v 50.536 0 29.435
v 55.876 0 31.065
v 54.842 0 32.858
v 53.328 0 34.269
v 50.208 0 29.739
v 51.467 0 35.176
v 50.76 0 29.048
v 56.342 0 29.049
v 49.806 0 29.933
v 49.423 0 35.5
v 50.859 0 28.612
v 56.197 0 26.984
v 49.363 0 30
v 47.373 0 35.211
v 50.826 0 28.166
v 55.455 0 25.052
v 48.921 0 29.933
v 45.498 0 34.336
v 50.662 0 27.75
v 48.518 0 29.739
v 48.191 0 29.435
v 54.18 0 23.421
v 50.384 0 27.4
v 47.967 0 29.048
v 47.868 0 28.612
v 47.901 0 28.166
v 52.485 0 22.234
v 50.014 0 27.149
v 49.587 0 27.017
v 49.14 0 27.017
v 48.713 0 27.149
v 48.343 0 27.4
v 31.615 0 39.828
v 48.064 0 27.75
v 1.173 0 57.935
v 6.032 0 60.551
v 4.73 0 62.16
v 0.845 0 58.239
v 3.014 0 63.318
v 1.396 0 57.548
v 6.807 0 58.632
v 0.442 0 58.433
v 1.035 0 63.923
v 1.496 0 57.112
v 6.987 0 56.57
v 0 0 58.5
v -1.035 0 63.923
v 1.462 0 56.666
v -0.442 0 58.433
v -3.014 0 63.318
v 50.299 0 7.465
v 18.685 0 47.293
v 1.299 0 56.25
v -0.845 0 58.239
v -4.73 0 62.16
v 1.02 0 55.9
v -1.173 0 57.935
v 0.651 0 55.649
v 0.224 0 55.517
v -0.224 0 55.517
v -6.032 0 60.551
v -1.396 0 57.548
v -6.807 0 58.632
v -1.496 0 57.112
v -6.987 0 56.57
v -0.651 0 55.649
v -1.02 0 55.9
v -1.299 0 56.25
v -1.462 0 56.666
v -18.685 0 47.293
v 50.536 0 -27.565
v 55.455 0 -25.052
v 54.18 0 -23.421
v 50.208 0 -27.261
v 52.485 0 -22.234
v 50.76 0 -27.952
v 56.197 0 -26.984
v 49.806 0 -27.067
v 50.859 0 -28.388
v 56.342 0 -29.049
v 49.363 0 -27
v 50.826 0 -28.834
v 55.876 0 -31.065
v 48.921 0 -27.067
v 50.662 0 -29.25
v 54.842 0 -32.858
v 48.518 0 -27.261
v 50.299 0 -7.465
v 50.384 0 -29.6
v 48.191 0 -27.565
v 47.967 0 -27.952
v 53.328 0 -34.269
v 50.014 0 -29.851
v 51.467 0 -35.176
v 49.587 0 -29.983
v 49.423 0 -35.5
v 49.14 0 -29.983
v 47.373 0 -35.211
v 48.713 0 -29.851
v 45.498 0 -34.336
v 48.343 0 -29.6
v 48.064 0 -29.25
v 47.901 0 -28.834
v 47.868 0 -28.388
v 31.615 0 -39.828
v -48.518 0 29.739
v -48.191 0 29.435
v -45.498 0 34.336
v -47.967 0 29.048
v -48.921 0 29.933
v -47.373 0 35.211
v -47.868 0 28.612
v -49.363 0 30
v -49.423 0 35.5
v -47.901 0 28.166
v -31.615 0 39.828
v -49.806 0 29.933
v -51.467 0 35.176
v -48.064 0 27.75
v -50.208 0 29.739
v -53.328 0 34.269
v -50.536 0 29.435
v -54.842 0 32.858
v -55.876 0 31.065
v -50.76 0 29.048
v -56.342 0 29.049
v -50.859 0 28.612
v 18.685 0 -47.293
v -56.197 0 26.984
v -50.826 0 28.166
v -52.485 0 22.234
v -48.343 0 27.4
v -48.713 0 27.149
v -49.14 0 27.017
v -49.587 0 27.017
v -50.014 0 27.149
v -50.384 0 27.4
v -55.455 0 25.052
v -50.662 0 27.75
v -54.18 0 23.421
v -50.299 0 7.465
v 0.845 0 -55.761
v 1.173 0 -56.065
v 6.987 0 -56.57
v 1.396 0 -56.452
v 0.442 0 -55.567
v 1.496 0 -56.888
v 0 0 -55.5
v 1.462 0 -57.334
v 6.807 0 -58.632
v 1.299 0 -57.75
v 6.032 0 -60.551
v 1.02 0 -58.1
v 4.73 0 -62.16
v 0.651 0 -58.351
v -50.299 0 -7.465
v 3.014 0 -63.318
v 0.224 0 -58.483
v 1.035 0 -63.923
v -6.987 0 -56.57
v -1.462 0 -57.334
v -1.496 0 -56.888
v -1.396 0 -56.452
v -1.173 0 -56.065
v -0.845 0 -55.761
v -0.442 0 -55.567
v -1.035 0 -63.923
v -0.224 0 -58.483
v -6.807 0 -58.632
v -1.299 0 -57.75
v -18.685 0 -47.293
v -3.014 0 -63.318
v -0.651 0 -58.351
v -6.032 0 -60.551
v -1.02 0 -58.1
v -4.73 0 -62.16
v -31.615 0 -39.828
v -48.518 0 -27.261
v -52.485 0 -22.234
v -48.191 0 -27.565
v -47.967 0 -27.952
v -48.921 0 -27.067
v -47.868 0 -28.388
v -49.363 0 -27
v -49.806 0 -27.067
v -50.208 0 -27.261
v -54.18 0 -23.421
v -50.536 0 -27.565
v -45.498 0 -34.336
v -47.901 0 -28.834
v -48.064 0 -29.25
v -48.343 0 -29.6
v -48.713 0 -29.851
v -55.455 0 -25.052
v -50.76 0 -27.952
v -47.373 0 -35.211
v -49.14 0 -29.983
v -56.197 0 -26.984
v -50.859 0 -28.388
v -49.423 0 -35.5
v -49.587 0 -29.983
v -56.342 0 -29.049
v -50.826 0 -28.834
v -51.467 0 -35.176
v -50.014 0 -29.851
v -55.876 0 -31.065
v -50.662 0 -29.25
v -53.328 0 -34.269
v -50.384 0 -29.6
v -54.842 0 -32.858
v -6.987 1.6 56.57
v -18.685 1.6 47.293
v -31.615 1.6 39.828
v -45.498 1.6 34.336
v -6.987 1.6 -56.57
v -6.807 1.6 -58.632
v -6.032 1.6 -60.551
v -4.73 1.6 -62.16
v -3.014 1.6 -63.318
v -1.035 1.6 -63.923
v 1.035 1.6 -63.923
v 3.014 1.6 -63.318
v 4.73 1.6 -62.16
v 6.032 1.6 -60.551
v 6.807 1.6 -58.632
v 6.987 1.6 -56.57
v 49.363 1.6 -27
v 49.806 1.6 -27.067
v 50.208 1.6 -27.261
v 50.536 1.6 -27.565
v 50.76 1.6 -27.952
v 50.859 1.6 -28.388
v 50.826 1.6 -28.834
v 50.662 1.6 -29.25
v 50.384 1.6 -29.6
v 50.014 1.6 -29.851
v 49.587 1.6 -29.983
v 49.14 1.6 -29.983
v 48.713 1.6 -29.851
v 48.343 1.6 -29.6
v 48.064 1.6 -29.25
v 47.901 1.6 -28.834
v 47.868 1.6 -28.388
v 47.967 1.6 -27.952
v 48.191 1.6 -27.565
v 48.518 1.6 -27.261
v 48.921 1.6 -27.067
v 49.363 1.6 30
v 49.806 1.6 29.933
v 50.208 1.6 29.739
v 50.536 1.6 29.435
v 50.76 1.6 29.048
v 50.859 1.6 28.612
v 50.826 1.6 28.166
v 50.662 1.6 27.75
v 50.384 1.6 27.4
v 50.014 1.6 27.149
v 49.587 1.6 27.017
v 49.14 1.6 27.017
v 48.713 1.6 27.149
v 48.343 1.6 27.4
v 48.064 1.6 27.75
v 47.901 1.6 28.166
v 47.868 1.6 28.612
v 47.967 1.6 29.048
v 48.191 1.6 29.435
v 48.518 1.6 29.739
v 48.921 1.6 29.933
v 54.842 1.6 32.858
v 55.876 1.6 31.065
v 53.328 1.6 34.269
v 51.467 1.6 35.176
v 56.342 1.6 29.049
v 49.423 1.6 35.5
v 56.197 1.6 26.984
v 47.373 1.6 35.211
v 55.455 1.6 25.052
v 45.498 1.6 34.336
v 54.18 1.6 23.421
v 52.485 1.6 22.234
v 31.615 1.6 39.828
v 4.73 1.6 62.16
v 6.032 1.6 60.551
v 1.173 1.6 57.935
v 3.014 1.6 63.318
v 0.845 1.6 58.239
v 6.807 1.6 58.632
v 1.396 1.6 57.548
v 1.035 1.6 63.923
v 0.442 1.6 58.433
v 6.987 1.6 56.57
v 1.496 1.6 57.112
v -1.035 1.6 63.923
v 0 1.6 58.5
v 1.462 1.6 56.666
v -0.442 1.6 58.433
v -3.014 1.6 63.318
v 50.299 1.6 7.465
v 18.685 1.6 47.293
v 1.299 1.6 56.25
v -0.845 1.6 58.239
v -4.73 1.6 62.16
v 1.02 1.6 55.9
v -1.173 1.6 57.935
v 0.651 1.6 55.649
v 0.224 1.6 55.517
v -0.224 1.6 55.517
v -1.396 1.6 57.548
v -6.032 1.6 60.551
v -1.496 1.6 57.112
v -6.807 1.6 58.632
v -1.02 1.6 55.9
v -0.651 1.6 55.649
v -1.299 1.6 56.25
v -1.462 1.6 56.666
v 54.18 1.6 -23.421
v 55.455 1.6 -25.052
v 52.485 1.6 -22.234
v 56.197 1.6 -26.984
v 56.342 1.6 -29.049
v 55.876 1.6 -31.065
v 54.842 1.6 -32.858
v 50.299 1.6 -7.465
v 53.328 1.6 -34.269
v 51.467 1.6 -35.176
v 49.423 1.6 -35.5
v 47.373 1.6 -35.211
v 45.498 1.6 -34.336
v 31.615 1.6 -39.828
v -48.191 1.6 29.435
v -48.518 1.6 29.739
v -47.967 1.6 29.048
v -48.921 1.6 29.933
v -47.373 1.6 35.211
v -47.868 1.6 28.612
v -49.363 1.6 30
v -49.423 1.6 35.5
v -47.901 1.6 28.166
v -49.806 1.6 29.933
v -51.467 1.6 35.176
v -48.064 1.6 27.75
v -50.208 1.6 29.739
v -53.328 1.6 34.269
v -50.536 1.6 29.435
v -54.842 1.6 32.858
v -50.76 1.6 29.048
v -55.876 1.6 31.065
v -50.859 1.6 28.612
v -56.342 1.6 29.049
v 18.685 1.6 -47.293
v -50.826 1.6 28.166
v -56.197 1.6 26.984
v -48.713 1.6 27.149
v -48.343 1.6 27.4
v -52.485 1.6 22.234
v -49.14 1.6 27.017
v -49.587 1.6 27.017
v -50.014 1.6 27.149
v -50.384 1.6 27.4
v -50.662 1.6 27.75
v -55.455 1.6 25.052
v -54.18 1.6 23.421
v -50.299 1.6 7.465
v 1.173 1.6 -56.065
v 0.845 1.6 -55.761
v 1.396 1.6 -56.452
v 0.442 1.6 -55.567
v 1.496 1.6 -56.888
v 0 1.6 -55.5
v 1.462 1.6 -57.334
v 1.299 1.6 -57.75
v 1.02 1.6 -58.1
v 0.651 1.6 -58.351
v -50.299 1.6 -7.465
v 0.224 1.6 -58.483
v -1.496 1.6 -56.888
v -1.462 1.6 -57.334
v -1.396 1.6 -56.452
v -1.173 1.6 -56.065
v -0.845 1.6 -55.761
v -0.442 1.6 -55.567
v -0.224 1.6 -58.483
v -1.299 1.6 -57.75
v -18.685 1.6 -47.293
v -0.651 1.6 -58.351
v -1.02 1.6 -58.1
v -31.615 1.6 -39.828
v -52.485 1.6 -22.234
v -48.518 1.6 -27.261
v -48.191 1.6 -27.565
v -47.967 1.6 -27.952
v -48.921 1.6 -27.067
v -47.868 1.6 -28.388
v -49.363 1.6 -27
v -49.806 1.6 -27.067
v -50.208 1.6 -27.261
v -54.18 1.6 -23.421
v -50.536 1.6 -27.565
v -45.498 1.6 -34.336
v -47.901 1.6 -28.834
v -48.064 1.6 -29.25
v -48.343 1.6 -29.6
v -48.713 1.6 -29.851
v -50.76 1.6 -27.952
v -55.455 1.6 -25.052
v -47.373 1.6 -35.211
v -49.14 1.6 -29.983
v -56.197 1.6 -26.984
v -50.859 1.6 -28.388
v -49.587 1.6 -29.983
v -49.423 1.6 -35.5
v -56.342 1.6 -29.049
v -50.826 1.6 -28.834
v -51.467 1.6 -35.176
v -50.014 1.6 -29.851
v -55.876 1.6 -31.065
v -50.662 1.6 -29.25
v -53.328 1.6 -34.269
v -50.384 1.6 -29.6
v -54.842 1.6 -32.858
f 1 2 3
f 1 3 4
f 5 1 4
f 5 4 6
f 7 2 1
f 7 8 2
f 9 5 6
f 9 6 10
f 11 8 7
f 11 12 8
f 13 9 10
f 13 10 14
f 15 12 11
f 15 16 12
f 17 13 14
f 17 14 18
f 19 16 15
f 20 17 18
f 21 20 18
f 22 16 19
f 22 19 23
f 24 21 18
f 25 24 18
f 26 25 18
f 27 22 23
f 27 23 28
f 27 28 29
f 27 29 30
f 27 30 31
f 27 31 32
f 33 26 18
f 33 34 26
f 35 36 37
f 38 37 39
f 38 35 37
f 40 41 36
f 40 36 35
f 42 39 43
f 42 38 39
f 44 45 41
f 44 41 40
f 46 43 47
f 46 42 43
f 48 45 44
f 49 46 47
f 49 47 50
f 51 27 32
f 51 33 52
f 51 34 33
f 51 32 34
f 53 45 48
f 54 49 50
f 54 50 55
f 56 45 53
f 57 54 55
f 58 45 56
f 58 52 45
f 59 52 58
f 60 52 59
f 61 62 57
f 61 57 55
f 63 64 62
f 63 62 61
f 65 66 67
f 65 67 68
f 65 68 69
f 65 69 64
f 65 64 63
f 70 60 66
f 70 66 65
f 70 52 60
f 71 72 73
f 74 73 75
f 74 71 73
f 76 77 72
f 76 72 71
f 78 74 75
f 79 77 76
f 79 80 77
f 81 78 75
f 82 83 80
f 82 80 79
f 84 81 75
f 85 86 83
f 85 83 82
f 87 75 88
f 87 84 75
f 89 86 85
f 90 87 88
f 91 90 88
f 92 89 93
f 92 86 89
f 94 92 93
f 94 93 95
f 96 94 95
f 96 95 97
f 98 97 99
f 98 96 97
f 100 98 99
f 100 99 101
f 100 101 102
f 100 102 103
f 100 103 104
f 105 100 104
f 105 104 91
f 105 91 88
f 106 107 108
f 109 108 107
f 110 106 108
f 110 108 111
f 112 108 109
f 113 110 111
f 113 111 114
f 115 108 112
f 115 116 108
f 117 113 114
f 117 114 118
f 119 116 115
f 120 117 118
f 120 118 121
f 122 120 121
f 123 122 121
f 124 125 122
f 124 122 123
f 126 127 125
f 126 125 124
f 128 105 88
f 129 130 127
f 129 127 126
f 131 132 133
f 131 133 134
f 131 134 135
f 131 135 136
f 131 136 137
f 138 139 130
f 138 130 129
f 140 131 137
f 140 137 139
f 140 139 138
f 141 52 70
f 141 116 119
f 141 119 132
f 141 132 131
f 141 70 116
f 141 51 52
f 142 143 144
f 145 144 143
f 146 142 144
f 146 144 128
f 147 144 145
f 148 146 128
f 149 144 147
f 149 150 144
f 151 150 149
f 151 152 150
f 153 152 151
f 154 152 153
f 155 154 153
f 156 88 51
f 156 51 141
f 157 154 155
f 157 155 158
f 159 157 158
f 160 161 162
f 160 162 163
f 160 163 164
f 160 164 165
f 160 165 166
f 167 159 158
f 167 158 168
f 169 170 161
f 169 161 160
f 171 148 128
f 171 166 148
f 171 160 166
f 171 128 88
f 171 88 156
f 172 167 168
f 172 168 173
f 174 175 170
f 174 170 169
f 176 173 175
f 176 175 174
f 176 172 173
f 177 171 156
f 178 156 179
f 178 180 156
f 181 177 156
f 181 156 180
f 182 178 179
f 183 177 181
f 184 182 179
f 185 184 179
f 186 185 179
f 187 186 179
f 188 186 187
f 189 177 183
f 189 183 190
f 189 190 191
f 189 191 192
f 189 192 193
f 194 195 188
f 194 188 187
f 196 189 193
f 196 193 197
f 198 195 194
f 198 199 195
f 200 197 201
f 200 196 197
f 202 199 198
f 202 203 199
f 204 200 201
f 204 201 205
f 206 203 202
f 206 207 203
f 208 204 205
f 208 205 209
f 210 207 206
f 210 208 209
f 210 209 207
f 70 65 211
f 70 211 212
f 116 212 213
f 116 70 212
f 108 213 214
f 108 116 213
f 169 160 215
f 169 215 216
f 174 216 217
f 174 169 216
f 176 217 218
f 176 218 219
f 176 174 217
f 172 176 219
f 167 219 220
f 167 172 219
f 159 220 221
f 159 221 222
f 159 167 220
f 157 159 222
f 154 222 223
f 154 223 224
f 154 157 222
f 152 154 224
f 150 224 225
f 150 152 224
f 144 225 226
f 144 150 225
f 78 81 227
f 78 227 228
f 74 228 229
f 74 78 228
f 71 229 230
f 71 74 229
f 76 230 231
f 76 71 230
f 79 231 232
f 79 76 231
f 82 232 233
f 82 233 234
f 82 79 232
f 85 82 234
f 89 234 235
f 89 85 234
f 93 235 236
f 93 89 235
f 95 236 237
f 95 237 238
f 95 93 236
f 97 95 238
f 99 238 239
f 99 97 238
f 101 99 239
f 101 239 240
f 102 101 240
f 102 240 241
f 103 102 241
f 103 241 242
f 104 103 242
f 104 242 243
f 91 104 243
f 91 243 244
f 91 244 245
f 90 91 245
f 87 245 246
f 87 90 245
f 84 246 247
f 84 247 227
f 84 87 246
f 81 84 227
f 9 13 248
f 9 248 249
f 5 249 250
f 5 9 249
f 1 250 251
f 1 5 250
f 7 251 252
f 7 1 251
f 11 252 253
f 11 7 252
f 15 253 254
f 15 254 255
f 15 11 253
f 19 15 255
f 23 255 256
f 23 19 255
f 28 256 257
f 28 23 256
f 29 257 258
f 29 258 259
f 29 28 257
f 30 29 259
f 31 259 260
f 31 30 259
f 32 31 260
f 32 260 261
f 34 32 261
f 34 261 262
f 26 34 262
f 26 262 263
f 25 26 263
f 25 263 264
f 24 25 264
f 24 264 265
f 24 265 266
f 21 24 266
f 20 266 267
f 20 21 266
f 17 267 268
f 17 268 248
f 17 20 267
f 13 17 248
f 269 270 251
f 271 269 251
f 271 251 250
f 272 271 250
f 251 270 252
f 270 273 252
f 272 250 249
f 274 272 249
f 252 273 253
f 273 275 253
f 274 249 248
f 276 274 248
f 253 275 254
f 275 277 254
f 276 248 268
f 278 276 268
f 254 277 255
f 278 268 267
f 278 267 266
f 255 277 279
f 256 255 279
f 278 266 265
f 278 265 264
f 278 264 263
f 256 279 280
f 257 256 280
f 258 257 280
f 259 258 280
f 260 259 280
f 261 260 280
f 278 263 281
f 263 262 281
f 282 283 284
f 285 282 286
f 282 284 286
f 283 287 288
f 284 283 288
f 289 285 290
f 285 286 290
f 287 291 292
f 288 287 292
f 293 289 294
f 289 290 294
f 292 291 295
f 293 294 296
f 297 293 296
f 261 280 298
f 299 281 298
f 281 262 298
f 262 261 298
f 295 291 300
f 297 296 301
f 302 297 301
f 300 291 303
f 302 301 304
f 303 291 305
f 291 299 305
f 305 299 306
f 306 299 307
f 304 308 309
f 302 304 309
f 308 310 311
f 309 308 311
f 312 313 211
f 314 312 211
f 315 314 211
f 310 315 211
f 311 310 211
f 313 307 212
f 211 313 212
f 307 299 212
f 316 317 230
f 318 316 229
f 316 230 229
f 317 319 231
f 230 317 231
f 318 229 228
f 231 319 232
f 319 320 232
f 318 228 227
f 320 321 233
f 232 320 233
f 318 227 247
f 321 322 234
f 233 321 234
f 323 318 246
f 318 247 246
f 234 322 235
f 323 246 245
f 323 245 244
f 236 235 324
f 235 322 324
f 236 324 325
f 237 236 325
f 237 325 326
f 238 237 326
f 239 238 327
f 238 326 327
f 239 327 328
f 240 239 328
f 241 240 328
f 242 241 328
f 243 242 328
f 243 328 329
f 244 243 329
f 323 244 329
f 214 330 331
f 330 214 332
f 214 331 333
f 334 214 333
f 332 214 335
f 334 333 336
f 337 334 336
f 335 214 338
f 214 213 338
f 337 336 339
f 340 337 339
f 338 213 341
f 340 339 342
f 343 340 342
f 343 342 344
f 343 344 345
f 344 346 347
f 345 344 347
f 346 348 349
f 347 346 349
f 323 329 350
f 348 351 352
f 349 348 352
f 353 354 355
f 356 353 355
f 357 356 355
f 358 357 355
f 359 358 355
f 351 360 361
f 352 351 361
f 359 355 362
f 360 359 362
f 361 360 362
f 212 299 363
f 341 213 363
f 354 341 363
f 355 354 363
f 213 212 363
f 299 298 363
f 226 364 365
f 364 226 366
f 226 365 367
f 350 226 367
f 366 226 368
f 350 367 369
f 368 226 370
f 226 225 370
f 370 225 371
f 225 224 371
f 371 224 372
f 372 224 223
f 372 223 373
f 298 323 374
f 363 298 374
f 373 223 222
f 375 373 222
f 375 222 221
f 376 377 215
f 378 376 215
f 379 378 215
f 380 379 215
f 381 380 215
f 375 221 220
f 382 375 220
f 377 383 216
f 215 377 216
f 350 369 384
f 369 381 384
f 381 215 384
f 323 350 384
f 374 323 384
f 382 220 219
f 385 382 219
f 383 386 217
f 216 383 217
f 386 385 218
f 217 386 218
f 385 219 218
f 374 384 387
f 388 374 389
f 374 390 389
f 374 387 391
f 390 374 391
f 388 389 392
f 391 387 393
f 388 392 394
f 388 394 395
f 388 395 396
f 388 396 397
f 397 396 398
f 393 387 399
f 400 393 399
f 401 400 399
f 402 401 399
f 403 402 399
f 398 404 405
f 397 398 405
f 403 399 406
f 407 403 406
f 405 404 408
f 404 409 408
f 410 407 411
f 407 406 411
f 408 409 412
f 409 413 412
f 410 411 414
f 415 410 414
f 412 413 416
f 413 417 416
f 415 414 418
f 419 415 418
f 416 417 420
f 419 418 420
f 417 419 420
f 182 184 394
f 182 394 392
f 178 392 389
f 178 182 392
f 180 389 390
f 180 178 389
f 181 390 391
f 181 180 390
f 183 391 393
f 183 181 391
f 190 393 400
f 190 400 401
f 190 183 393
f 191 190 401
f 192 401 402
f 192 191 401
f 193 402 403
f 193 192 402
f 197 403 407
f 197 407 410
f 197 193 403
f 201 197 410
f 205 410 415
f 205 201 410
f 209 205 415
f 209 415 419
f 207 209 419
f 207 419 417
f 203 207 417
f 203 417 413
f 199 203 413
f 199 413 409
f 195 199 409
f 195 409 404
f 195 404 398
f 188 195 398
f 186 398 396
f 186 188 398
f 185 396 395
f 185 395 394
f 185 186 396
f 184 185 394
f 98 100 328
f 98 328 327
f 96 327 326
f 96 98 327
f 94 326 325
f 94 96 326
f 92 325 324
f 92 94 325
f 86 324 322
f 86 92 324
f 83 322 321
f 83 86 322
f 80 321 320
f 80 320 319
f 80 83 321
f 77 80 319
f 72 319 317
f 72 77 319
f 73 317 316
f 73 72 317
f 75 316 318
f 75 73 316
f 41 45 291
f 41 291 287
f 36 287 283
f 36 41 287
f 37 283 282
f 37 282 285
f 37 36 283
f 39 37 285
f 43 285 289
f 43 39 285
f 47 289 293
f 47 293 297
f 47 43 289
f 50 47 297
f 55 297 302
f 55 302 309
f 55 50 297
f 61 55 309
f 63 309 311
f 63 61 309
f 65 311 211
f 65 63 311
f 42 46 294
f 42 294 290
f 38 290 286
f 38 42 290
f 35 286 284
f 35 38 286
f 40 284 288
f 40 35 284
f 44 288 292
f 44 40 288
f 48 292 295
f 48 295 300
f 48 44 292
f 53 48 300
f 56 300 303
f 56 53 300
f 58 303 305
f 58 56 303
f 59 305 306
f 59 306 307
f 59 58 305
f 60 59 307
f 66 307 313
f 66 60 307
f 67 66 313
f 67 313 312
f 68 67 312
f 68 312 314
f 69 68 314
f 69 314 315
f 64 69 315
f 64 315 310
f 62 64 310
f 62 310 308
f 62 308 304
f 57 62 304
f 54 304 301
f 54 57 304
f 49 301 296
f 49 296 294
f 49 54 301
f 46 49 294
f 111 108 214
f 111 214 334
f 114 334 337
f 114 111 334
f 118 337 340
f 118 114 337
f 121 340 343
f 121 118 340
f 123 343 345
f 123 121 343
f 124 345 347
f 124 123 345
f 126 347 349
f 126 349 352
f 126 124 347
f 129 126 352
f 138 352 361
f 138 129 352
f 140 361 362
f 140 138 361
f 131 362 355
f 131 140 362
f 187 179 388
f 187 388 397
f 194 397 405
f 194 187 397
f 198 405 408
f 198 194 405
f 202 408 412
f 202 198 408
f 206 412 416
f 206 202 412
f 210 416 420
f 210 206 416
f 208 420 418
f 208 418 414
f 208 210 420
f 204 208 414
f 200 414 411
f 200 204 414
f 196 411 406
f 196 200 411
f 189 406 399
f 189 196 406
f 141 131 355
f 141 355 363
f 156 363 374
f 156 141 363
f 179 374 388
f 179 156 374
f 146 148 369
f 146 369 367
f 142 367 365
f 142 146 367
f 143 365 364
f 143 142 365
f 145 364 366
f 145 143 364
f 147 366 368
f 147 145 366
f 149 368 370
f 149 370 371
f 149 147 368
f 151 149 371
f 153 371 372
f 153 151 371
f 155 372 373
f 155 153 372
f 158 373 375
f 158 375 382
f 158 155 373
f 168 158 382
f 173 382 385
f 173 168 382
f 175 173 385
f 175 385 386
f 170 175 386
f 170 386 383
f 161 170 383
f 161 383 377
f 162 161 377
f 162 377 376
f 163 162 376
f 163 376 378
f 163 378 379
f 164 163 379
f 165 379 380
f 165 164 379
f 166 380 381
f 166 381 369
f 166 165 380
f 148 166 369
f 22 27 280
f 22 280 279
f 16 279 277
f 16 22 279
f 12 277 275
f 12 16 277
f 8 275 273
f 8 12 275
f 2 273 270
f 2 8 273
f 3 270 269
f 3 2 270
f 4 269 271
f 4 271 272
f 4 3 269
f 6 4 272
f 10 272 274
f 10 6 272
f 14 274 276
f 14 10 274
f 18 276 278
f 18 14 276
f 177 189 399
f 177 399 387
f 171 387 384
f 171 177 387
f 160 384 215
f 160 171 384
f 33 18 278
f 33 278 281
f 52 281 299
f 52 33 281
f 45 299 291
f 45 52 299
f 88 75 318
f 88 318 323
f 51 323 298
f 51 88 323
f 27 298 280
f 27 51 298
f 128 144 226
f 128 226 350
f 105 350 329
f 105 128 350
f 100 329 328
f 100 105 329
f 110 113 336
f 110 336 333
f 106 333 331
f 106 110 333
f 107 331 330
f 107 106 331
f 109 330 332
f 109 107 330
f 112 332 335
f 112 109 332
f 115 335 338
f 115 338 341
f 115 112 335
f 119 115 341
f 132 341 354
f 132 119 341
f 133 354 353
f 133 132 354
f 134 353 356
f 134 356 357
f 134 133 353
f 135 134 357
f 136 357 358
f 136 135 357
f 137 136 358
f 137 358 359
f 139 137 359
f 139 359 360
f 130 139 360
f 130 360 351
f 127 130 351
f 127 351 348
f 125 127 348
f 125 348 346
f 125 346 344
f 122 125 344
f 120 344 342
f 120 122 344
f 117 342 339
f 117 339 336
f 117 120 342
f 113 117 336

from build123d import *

# Parameters (mm, degrees)
ESBO_O1_R                = 1.5
RESSALTO_EXTRUS_O1_DEPTH = 1.6


with BuildPart() as part:
    # Esboço1 → Ressalto-extrusão1 (new body)
    with BuildSketch(Plane(origin=(0, 0, 0), x_dir=(1, 0, 0), z_dir=(0, 1, 0))):
        with BuildLine():
            ThreePointArc((-52.484604611, -22.234349076), (-50.025216279, 0), (-52.484604611, 22.234349076))
            ThreePointArc((-52.484604611, 22.234349076), (-55.425625842, 32), (-45.497813442, 34.335826363))
            ThreePointArc((-45.497813442, 34.335826363), (-25.01260814, 43.323108128), (-6.98679117, 56.570175439))
            ThreePointArc((-6.98679117, 56.570175439), (0, 64), (6.98679117, 56.570175439))
            ThreePointArc((6.98679117, 56.570175439), (25.01260814, 43.323108128), (45.497813442, 34.335826363))
            ThreePointArc((45.497813442, 34.335826363), (55.425625842, 32), (52.484604611, 22.234349076))
            ThreePointArc((52.484604611, 22.234349076), (50.025216279, 0), (52.484604611, -22.234349076))
            ThreePointArc((52.484604611, -22.234349076), (55.425625842, -32), (45.497813442, -34.335826363))
            ThreePointArc((45.497813442, -34.335826363), (25.01260814, -43.323108128), (6.98679117, -56.570175439))
            ThreePointArc((6.98679117, -56.570175439), (0, -64), (-6.98679117, -56.570175439))
            ThreePointArc((-6.98679117, -56.570175439), (-25.01260814, -43.323108128), (-45.497813442, -34.335826363))
            ThreePointArc((-45.497813442, -34.335826363), (-55.425625842, -32), (-52.484604611, -22.234349076))
        make_face()
        with Locations(Location((-49.363448016, 28.5, 0), (0, 0, 270))):
            Circle(ESBO_O1_R, mode=Mode.SUBTRACT)
        with Locations(Location((-49.363448016, -28.5, 0), (0, 0, 270))):
            Circle(ESBO_O1_R, mode=Mode.SUBTRACT)
        with Locations(Location((0, -57, 0), (0, 0, 270))):
            Circle(ESBO_O1_R, mode=Mode.SUBTRACT)
        with Locations(Location((49.363448016, -28.5, 0), (0, 0, 270))):
            Circle(ESBO_O1_R, mode=Mode.SUBTRACT)
        with Locations(Location((49.363448016, 28.5, 0), (0, 0, 270))):
            Circle(ESBO_O1_R, mode=Mode.SUBTRACT)
        with Locations(Location((0, 57, 0), (0, 0, 270))):
            Circle(ESBO_O1_R, mode=Mode.SUBTRACT)
    extrude(amount=RESSALTO_EXTRUS_O1_DEPTH)


solid = part.part
